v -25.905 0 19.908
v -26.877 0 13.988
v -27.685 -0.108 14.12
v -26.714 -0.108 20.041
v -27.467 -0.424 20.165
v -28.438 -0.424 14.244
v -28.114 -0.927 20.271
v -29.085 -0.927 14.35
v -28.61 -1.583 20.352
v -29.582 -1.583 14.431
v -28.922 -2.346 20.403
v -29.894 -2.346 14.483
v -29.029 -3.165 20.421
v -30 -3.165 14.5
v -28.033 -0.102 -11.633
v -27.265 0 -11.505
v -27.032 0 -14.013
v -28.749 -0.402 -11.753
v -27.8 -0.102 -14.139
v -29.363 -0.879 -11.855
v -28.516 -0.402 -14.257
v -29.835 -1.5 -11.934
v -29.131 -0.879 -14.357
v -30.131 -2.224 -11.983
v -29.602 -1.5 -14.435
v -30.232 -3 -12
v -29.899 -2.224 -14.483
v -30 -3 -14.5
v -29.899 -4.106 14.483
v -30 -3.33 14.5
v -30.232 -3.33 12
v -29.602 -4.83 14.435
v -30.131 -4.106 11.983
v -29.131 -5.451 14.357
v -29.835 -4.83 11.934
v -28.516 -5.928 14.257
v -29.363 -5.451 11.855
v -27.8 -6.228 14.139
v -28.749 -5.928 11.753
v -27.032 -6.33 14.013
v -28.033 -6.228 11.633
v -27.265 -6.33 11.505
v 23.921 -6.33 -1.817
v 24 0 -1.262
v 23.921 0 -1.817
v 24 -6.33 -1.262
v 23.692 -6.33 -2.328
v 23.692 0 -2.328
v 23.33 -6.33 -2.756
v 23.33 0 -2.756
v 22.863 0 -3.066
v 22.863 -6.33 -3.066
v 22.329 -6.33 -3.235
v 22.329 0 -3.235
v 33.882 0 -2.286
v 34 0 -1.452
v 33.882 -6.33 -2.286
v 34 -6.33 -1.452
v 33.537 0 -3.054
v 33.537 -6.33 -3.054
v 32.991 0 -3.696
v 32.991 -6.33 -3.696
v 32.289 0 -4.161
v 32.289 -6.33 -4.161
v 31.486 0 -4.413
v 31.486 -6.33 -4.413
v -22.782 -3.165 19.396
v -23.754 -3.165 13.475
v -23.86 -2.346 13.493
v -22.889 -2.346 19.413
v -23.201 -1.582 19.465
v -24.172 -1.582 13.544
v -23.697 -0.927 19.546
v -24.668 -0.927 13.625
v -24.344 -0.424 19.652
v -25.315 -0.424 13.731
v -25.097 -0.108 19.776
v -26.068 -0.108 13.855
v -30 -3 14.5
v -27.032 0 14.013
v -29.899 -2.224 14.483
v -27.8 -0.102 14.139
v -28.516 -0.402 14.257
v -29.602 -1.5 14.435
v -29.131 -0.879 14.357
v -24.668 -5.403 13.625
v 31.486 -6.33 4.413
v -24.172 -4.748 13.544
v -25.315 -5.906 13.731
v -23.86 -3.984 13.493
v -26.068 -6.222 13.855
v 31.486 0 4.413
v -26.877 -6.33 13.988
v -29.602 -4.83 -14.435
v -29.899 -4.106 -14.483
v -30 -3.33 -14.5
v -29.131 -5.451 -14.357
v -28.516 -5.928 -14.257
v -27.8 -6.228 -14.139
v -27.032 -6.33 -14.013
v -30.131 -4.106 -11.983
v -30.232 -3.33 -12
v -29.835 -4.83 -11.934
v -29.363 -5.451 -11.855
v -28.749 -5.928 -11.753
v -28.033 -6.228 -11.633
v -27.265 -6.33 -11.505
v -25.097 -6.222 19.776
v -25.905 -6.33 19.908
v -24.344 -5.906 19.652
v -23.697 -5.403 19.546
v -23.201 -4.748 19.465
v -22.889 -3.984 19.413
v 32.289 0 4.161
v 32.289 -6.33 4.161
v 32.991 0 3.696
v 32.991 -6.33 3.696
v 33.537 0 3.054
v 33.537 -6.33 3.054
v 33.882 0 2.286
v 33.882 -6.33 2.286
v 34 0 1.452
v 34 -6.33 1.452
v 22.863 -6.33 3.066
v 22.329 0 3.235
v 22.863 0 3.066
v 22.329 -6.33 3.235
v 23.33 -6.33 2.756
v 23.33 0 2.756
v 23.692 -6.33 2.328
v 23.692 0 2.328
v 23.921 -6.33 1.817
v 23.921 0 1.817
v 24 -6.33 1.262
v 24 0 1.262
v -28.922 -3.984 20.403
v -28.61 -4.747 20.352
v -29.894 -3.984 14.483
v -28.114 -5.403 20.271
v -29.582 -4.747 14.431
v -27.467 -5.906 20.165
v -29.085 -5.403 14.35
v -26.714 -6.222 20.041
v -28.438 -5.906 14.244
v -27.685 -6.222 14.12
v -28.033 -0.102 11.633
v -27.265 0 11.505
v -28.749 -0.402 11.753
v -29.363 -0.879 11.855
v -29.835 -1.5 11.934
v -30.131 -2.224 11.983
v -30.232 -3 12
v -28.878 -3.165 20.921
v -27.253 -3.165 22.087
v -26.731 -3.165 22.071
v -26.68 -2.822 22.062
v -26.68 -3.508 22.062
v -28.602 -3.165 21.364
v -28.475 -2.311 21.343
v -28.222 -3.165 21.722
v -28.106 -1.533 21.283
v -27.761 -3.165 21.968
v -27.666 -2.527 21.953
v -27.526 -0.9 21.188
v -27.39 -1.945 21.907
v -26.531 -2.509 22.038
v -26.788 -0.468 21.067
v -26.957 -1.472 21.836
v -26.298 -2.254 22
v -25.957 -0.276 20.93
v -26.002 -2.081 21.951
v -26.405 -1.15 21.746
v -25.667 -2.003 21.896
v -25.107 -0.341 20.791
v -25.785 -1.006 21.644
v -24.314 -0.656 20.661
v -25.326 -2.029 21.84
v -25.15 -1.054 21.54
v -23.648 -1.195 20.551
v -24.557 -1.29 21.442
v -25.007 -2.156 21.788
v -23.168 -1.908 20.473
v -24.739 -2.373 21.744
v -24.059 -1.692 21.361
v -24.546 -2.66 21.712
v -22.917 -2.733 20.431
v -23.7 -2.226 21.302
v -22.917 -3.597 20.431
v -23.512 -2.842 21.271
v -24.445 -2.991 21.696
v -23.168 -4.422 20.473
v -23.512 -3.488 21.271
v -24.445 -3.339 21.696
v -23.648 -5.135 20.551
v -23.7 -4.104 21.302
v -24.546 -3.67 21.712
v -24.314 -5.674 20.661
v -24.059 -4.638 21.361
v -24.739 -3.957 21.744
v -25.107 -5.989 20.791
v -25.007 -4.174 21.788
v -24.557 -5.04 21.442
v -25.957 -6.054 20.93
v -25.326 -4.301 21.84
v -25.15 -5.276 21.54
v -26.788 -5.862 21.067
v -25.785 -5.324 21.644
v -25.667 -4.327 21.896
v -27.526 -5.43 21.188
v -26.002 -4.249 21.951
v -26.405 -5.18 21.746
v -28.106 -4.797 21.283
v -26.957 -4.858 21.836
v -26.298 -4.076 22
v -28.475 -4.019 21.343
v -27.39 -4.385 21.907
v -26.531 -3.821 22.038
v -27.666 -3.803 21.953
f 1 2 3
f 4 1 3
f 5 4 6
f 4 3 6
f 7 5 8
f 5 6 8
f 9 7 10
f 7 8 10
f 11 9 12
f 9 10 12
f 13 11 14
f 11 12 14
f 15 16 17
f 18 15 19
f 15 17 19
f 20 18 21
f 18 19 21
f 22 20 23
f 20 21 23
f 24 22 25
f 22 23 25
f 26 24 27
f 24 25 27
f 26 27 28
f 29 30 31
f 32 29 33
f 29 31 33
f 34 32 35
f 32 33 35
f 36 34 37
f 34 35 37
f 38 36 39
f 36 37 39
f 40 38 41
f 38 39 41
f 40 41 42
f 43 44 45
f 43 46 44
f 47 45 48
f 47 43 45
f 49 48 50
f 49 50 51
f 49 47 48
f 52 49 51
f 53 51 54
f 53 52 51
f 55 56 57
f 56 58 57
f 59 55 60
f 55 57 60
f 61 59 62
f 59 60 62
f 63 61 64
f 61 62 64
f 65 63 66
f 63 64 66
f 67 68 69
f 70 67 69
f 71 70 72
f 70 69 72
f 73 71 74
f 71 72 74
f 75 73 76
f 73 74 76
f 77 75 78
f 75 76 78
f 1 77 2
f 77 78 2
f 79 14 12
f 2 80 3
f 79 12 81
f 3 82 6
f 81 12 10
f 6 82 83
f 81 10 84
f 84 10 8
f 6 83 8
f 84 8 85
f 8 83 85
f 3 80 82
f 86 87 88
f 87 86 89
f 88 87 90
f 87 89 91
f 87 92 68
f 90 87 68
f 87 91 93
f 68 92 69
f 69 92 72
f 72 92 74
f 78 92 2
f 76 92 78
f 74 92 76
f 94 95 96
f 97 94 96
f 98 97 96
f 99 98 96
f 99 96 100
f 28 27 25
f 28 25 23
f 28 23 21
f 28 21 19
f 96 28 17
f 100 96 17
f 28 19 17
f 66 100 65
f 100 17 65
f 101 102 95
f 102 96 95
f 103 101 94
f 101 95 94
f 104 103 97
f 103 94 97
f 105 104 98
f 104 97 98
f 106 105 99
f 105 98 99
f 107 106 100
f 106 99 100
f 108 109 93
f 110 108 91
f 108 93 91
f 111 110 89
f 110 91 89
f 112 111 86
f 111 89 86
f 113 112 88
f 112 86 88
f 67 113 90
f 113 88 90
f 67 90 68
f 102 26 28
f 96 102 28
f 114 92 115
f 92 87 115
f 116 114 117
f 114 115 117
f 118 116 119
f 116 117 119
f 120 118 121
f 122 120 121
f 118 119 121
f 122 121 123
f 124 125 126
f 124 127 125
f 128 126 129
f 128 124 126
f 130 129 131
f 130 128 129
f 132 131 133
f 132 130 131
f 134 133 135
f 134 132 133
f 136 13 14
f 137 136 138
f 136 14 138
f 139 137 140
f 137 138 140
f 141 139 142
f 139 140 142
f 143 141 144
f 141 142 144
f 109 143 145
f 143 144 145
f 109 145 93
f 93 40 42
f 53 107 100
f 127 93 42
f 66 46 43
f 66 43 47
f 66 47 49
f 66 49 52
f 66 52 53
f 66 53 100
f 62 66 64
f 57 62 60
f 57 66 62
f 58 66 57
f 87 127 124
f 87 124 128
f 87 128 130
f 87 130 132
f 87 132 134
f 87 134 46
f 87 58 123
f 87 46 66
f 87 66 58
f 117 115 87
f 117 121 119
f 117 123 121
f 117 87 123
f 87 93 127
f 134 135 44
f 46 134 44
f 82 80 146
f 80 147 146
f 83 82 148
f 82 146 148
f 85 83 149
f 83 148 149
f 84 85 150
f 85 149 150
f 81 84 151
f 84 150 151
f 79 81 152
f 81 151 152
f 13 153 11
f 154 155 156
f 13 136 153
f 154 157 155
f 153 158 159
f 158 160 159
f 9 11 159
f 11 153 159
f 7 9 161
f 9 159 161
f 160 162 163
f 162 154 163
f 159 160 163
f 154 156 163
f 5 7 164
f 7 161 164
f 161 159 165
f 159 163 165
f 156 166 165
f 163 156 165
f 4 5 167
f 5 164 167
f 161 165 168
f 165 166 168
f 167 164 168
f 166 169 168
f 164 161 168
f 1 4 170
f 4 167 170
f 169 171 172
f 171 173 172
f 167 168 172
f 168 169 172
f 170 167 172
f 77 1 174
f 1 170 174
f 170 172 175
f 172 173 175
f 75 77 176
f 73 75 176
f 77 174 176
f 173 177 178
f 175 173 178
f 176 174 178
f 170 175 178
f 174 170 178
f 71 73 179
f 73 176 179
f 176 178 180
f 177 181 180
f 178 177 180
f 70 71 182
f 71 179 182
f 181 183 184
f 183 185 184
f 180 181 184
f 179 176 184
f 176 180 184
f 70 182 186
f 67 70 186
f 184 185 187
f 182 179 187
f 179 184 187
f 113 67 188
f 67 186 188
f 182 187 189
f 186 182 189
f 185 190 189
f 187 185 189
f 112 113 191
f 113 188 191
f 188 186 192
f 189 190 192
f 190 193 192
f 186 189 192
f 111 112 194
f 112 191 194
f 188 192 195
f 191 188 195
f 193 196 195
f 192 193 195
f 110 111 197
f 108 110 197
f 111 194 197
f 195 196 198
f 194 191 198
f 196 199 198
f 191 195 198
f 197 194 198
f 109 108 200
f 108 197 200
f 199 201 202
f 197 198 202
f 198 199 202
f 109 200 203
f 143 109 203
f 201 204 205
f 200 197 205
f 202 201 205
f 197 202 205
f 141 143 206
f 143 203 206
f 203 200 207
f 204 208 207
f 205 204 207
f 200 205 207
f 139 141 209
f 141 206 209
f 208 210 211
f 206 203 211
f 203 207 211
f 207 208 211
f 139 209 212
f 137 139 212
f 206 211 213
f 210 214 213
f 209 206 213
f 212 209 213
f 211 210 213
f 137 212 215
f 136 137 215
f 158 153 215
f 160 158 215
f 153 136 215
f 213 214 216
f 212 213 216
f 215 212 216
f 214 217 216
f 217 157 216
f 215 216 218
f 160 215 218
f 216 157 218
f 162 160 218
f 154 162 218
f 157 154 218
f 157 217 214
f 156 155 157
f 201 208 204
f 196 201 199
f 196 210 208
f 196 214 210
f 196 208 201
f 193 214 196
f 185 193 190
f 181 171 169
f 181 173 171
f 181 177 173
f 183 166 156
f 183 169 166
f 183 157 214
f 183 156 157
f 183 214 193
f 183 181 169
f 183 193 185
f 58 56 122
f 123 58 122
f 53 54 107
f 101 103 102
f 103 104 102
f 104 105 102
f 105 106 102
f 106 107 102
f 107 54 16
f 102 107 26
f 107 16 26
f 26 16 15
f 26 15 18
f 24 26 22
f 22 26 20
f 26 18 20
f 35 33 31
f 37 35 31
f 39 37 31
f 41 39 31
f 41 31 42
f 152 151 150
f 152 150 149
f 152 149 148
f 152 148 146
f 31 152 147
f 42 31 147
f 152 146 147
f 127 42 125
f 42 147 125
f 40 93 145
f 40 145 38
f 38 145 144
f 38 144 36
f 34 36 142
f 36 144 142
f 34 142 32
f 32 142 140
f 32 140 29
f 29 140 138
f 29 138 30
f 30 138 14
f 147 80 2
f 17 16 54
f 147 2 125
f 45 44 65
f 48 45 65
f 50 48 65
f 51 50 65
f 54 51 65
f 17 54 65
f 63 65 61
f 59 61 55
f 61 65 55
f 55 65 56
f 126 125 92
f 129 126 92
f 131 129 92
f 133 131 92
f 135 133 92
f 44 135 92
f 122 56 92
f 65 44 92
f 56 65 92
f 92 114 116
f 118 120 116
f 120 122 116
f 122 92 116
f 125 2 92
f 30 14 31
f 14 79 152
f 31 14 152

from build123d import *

# Parameters (mm, degrees)
F1_DEPTH = 6.33
F2_R     = 2
F3_R     = 3
F5_DEPTH = 8
F7_R     = 3


# Not quite as in the source:
# - a fillet or chamfer that OpenCascade refuses, or shapes differently, is made with other operations: its cross-section is extruded or revolved along the edge and cut away or added


with BuildPart() as f1:
    # F0 (on Front) → F1 (new body)
    with BuildSketch(Plane.XZ):
        Polygon((34, 4), (-30, 14.5), (-30.2323504967, 12), (24, 2.9564342819), (24, -2.9564342819), (-30.2323504967, -12), (-30, -14.5), (34, -4), align=None)
    extrude(amount=F1_DEPTH)

    # F2
    f2_edges = [f1.edges().sort_by_distance(p)[0] for p in [
        (24, -3.165, -2.956434),
        (24, -3.165, 2.956434),
    ]]
    fillet(f2_edges, radius=F2_R)

    # F3
    f3_edges = [f1.edges().sort_by_distance(p)[0] for p in [
        (34, -3.165, 4),
        (34, -3.165, -4),
    ]]
    fillet(f3_edges, radius=F3_R)

    # F4 (on face) → F5 (join)
    with BuildSketch(Plane(origin=(1.5302228826, 0, 9.3270728083), x_dir=(0.9868074809, 0, -0.1618981023), z_dir=(0.1618981023, 0, 0.9868074809))):
        with BuildLine():
            ThreePointArc((-28.7867469125, -6.33), (-26.54875395, -5.4029929625), (-25.6217469125, -3.165))
            ThreePointArc((-25.6217469125, -3.165), (-26.54875395, -0.9270070375), (-28.7867469125, 0))
            ThreePointArc((-28.7867469125, 0), (-31.0247398749, -0.9270070375), (-31.9517469125, -3.165))
            ThreePointArc((-31.9517469125, -3.165), (-31.0247398749, -5.4029929625), (-28.7867469125, -6.33))
        make_face()
    extrude(amount=F5_DEPTH)

    # F6: fillet of radius 2 on 1 edges, made by hand

    # F6_s1 → F6_t2 (revolve, cut)
    with BuildSketch(Plane.XZ.offset(3.165)):
        with BuildLine():
            ThreePointArc((-29.0286113859, 20.4208448857), (-28.221594455, 21.7215636961), (-26.7312002194, 22.0706636429))
            Line((-26.7312002194, 22.0706636429), (-28.7048151813, 22.3944598476))
            Line((-28.7048151813, 22.3944598476), (-29.0286113859, 20.4208448857))
        make_face()
    revolve(axis=Axis((-25.581569504, -3.165, 21.8820523537), (-0.1618981023, 0, -0.9868074809)), mode=Mode.SUBTRACT)

    # F7
    f7_edges = [f1.edges().sort_by_distance(p)[0] for p in [
        (-30.116175, 0, 13.25),
        (-30.116175, -6.33, 13.25),
        (-30.116175, 0, -13.25),
        (-30.116175, -6.33, -13.25),
    ]]
    fillet(f7_edges, radius=F7_R)


solid = f1.part
